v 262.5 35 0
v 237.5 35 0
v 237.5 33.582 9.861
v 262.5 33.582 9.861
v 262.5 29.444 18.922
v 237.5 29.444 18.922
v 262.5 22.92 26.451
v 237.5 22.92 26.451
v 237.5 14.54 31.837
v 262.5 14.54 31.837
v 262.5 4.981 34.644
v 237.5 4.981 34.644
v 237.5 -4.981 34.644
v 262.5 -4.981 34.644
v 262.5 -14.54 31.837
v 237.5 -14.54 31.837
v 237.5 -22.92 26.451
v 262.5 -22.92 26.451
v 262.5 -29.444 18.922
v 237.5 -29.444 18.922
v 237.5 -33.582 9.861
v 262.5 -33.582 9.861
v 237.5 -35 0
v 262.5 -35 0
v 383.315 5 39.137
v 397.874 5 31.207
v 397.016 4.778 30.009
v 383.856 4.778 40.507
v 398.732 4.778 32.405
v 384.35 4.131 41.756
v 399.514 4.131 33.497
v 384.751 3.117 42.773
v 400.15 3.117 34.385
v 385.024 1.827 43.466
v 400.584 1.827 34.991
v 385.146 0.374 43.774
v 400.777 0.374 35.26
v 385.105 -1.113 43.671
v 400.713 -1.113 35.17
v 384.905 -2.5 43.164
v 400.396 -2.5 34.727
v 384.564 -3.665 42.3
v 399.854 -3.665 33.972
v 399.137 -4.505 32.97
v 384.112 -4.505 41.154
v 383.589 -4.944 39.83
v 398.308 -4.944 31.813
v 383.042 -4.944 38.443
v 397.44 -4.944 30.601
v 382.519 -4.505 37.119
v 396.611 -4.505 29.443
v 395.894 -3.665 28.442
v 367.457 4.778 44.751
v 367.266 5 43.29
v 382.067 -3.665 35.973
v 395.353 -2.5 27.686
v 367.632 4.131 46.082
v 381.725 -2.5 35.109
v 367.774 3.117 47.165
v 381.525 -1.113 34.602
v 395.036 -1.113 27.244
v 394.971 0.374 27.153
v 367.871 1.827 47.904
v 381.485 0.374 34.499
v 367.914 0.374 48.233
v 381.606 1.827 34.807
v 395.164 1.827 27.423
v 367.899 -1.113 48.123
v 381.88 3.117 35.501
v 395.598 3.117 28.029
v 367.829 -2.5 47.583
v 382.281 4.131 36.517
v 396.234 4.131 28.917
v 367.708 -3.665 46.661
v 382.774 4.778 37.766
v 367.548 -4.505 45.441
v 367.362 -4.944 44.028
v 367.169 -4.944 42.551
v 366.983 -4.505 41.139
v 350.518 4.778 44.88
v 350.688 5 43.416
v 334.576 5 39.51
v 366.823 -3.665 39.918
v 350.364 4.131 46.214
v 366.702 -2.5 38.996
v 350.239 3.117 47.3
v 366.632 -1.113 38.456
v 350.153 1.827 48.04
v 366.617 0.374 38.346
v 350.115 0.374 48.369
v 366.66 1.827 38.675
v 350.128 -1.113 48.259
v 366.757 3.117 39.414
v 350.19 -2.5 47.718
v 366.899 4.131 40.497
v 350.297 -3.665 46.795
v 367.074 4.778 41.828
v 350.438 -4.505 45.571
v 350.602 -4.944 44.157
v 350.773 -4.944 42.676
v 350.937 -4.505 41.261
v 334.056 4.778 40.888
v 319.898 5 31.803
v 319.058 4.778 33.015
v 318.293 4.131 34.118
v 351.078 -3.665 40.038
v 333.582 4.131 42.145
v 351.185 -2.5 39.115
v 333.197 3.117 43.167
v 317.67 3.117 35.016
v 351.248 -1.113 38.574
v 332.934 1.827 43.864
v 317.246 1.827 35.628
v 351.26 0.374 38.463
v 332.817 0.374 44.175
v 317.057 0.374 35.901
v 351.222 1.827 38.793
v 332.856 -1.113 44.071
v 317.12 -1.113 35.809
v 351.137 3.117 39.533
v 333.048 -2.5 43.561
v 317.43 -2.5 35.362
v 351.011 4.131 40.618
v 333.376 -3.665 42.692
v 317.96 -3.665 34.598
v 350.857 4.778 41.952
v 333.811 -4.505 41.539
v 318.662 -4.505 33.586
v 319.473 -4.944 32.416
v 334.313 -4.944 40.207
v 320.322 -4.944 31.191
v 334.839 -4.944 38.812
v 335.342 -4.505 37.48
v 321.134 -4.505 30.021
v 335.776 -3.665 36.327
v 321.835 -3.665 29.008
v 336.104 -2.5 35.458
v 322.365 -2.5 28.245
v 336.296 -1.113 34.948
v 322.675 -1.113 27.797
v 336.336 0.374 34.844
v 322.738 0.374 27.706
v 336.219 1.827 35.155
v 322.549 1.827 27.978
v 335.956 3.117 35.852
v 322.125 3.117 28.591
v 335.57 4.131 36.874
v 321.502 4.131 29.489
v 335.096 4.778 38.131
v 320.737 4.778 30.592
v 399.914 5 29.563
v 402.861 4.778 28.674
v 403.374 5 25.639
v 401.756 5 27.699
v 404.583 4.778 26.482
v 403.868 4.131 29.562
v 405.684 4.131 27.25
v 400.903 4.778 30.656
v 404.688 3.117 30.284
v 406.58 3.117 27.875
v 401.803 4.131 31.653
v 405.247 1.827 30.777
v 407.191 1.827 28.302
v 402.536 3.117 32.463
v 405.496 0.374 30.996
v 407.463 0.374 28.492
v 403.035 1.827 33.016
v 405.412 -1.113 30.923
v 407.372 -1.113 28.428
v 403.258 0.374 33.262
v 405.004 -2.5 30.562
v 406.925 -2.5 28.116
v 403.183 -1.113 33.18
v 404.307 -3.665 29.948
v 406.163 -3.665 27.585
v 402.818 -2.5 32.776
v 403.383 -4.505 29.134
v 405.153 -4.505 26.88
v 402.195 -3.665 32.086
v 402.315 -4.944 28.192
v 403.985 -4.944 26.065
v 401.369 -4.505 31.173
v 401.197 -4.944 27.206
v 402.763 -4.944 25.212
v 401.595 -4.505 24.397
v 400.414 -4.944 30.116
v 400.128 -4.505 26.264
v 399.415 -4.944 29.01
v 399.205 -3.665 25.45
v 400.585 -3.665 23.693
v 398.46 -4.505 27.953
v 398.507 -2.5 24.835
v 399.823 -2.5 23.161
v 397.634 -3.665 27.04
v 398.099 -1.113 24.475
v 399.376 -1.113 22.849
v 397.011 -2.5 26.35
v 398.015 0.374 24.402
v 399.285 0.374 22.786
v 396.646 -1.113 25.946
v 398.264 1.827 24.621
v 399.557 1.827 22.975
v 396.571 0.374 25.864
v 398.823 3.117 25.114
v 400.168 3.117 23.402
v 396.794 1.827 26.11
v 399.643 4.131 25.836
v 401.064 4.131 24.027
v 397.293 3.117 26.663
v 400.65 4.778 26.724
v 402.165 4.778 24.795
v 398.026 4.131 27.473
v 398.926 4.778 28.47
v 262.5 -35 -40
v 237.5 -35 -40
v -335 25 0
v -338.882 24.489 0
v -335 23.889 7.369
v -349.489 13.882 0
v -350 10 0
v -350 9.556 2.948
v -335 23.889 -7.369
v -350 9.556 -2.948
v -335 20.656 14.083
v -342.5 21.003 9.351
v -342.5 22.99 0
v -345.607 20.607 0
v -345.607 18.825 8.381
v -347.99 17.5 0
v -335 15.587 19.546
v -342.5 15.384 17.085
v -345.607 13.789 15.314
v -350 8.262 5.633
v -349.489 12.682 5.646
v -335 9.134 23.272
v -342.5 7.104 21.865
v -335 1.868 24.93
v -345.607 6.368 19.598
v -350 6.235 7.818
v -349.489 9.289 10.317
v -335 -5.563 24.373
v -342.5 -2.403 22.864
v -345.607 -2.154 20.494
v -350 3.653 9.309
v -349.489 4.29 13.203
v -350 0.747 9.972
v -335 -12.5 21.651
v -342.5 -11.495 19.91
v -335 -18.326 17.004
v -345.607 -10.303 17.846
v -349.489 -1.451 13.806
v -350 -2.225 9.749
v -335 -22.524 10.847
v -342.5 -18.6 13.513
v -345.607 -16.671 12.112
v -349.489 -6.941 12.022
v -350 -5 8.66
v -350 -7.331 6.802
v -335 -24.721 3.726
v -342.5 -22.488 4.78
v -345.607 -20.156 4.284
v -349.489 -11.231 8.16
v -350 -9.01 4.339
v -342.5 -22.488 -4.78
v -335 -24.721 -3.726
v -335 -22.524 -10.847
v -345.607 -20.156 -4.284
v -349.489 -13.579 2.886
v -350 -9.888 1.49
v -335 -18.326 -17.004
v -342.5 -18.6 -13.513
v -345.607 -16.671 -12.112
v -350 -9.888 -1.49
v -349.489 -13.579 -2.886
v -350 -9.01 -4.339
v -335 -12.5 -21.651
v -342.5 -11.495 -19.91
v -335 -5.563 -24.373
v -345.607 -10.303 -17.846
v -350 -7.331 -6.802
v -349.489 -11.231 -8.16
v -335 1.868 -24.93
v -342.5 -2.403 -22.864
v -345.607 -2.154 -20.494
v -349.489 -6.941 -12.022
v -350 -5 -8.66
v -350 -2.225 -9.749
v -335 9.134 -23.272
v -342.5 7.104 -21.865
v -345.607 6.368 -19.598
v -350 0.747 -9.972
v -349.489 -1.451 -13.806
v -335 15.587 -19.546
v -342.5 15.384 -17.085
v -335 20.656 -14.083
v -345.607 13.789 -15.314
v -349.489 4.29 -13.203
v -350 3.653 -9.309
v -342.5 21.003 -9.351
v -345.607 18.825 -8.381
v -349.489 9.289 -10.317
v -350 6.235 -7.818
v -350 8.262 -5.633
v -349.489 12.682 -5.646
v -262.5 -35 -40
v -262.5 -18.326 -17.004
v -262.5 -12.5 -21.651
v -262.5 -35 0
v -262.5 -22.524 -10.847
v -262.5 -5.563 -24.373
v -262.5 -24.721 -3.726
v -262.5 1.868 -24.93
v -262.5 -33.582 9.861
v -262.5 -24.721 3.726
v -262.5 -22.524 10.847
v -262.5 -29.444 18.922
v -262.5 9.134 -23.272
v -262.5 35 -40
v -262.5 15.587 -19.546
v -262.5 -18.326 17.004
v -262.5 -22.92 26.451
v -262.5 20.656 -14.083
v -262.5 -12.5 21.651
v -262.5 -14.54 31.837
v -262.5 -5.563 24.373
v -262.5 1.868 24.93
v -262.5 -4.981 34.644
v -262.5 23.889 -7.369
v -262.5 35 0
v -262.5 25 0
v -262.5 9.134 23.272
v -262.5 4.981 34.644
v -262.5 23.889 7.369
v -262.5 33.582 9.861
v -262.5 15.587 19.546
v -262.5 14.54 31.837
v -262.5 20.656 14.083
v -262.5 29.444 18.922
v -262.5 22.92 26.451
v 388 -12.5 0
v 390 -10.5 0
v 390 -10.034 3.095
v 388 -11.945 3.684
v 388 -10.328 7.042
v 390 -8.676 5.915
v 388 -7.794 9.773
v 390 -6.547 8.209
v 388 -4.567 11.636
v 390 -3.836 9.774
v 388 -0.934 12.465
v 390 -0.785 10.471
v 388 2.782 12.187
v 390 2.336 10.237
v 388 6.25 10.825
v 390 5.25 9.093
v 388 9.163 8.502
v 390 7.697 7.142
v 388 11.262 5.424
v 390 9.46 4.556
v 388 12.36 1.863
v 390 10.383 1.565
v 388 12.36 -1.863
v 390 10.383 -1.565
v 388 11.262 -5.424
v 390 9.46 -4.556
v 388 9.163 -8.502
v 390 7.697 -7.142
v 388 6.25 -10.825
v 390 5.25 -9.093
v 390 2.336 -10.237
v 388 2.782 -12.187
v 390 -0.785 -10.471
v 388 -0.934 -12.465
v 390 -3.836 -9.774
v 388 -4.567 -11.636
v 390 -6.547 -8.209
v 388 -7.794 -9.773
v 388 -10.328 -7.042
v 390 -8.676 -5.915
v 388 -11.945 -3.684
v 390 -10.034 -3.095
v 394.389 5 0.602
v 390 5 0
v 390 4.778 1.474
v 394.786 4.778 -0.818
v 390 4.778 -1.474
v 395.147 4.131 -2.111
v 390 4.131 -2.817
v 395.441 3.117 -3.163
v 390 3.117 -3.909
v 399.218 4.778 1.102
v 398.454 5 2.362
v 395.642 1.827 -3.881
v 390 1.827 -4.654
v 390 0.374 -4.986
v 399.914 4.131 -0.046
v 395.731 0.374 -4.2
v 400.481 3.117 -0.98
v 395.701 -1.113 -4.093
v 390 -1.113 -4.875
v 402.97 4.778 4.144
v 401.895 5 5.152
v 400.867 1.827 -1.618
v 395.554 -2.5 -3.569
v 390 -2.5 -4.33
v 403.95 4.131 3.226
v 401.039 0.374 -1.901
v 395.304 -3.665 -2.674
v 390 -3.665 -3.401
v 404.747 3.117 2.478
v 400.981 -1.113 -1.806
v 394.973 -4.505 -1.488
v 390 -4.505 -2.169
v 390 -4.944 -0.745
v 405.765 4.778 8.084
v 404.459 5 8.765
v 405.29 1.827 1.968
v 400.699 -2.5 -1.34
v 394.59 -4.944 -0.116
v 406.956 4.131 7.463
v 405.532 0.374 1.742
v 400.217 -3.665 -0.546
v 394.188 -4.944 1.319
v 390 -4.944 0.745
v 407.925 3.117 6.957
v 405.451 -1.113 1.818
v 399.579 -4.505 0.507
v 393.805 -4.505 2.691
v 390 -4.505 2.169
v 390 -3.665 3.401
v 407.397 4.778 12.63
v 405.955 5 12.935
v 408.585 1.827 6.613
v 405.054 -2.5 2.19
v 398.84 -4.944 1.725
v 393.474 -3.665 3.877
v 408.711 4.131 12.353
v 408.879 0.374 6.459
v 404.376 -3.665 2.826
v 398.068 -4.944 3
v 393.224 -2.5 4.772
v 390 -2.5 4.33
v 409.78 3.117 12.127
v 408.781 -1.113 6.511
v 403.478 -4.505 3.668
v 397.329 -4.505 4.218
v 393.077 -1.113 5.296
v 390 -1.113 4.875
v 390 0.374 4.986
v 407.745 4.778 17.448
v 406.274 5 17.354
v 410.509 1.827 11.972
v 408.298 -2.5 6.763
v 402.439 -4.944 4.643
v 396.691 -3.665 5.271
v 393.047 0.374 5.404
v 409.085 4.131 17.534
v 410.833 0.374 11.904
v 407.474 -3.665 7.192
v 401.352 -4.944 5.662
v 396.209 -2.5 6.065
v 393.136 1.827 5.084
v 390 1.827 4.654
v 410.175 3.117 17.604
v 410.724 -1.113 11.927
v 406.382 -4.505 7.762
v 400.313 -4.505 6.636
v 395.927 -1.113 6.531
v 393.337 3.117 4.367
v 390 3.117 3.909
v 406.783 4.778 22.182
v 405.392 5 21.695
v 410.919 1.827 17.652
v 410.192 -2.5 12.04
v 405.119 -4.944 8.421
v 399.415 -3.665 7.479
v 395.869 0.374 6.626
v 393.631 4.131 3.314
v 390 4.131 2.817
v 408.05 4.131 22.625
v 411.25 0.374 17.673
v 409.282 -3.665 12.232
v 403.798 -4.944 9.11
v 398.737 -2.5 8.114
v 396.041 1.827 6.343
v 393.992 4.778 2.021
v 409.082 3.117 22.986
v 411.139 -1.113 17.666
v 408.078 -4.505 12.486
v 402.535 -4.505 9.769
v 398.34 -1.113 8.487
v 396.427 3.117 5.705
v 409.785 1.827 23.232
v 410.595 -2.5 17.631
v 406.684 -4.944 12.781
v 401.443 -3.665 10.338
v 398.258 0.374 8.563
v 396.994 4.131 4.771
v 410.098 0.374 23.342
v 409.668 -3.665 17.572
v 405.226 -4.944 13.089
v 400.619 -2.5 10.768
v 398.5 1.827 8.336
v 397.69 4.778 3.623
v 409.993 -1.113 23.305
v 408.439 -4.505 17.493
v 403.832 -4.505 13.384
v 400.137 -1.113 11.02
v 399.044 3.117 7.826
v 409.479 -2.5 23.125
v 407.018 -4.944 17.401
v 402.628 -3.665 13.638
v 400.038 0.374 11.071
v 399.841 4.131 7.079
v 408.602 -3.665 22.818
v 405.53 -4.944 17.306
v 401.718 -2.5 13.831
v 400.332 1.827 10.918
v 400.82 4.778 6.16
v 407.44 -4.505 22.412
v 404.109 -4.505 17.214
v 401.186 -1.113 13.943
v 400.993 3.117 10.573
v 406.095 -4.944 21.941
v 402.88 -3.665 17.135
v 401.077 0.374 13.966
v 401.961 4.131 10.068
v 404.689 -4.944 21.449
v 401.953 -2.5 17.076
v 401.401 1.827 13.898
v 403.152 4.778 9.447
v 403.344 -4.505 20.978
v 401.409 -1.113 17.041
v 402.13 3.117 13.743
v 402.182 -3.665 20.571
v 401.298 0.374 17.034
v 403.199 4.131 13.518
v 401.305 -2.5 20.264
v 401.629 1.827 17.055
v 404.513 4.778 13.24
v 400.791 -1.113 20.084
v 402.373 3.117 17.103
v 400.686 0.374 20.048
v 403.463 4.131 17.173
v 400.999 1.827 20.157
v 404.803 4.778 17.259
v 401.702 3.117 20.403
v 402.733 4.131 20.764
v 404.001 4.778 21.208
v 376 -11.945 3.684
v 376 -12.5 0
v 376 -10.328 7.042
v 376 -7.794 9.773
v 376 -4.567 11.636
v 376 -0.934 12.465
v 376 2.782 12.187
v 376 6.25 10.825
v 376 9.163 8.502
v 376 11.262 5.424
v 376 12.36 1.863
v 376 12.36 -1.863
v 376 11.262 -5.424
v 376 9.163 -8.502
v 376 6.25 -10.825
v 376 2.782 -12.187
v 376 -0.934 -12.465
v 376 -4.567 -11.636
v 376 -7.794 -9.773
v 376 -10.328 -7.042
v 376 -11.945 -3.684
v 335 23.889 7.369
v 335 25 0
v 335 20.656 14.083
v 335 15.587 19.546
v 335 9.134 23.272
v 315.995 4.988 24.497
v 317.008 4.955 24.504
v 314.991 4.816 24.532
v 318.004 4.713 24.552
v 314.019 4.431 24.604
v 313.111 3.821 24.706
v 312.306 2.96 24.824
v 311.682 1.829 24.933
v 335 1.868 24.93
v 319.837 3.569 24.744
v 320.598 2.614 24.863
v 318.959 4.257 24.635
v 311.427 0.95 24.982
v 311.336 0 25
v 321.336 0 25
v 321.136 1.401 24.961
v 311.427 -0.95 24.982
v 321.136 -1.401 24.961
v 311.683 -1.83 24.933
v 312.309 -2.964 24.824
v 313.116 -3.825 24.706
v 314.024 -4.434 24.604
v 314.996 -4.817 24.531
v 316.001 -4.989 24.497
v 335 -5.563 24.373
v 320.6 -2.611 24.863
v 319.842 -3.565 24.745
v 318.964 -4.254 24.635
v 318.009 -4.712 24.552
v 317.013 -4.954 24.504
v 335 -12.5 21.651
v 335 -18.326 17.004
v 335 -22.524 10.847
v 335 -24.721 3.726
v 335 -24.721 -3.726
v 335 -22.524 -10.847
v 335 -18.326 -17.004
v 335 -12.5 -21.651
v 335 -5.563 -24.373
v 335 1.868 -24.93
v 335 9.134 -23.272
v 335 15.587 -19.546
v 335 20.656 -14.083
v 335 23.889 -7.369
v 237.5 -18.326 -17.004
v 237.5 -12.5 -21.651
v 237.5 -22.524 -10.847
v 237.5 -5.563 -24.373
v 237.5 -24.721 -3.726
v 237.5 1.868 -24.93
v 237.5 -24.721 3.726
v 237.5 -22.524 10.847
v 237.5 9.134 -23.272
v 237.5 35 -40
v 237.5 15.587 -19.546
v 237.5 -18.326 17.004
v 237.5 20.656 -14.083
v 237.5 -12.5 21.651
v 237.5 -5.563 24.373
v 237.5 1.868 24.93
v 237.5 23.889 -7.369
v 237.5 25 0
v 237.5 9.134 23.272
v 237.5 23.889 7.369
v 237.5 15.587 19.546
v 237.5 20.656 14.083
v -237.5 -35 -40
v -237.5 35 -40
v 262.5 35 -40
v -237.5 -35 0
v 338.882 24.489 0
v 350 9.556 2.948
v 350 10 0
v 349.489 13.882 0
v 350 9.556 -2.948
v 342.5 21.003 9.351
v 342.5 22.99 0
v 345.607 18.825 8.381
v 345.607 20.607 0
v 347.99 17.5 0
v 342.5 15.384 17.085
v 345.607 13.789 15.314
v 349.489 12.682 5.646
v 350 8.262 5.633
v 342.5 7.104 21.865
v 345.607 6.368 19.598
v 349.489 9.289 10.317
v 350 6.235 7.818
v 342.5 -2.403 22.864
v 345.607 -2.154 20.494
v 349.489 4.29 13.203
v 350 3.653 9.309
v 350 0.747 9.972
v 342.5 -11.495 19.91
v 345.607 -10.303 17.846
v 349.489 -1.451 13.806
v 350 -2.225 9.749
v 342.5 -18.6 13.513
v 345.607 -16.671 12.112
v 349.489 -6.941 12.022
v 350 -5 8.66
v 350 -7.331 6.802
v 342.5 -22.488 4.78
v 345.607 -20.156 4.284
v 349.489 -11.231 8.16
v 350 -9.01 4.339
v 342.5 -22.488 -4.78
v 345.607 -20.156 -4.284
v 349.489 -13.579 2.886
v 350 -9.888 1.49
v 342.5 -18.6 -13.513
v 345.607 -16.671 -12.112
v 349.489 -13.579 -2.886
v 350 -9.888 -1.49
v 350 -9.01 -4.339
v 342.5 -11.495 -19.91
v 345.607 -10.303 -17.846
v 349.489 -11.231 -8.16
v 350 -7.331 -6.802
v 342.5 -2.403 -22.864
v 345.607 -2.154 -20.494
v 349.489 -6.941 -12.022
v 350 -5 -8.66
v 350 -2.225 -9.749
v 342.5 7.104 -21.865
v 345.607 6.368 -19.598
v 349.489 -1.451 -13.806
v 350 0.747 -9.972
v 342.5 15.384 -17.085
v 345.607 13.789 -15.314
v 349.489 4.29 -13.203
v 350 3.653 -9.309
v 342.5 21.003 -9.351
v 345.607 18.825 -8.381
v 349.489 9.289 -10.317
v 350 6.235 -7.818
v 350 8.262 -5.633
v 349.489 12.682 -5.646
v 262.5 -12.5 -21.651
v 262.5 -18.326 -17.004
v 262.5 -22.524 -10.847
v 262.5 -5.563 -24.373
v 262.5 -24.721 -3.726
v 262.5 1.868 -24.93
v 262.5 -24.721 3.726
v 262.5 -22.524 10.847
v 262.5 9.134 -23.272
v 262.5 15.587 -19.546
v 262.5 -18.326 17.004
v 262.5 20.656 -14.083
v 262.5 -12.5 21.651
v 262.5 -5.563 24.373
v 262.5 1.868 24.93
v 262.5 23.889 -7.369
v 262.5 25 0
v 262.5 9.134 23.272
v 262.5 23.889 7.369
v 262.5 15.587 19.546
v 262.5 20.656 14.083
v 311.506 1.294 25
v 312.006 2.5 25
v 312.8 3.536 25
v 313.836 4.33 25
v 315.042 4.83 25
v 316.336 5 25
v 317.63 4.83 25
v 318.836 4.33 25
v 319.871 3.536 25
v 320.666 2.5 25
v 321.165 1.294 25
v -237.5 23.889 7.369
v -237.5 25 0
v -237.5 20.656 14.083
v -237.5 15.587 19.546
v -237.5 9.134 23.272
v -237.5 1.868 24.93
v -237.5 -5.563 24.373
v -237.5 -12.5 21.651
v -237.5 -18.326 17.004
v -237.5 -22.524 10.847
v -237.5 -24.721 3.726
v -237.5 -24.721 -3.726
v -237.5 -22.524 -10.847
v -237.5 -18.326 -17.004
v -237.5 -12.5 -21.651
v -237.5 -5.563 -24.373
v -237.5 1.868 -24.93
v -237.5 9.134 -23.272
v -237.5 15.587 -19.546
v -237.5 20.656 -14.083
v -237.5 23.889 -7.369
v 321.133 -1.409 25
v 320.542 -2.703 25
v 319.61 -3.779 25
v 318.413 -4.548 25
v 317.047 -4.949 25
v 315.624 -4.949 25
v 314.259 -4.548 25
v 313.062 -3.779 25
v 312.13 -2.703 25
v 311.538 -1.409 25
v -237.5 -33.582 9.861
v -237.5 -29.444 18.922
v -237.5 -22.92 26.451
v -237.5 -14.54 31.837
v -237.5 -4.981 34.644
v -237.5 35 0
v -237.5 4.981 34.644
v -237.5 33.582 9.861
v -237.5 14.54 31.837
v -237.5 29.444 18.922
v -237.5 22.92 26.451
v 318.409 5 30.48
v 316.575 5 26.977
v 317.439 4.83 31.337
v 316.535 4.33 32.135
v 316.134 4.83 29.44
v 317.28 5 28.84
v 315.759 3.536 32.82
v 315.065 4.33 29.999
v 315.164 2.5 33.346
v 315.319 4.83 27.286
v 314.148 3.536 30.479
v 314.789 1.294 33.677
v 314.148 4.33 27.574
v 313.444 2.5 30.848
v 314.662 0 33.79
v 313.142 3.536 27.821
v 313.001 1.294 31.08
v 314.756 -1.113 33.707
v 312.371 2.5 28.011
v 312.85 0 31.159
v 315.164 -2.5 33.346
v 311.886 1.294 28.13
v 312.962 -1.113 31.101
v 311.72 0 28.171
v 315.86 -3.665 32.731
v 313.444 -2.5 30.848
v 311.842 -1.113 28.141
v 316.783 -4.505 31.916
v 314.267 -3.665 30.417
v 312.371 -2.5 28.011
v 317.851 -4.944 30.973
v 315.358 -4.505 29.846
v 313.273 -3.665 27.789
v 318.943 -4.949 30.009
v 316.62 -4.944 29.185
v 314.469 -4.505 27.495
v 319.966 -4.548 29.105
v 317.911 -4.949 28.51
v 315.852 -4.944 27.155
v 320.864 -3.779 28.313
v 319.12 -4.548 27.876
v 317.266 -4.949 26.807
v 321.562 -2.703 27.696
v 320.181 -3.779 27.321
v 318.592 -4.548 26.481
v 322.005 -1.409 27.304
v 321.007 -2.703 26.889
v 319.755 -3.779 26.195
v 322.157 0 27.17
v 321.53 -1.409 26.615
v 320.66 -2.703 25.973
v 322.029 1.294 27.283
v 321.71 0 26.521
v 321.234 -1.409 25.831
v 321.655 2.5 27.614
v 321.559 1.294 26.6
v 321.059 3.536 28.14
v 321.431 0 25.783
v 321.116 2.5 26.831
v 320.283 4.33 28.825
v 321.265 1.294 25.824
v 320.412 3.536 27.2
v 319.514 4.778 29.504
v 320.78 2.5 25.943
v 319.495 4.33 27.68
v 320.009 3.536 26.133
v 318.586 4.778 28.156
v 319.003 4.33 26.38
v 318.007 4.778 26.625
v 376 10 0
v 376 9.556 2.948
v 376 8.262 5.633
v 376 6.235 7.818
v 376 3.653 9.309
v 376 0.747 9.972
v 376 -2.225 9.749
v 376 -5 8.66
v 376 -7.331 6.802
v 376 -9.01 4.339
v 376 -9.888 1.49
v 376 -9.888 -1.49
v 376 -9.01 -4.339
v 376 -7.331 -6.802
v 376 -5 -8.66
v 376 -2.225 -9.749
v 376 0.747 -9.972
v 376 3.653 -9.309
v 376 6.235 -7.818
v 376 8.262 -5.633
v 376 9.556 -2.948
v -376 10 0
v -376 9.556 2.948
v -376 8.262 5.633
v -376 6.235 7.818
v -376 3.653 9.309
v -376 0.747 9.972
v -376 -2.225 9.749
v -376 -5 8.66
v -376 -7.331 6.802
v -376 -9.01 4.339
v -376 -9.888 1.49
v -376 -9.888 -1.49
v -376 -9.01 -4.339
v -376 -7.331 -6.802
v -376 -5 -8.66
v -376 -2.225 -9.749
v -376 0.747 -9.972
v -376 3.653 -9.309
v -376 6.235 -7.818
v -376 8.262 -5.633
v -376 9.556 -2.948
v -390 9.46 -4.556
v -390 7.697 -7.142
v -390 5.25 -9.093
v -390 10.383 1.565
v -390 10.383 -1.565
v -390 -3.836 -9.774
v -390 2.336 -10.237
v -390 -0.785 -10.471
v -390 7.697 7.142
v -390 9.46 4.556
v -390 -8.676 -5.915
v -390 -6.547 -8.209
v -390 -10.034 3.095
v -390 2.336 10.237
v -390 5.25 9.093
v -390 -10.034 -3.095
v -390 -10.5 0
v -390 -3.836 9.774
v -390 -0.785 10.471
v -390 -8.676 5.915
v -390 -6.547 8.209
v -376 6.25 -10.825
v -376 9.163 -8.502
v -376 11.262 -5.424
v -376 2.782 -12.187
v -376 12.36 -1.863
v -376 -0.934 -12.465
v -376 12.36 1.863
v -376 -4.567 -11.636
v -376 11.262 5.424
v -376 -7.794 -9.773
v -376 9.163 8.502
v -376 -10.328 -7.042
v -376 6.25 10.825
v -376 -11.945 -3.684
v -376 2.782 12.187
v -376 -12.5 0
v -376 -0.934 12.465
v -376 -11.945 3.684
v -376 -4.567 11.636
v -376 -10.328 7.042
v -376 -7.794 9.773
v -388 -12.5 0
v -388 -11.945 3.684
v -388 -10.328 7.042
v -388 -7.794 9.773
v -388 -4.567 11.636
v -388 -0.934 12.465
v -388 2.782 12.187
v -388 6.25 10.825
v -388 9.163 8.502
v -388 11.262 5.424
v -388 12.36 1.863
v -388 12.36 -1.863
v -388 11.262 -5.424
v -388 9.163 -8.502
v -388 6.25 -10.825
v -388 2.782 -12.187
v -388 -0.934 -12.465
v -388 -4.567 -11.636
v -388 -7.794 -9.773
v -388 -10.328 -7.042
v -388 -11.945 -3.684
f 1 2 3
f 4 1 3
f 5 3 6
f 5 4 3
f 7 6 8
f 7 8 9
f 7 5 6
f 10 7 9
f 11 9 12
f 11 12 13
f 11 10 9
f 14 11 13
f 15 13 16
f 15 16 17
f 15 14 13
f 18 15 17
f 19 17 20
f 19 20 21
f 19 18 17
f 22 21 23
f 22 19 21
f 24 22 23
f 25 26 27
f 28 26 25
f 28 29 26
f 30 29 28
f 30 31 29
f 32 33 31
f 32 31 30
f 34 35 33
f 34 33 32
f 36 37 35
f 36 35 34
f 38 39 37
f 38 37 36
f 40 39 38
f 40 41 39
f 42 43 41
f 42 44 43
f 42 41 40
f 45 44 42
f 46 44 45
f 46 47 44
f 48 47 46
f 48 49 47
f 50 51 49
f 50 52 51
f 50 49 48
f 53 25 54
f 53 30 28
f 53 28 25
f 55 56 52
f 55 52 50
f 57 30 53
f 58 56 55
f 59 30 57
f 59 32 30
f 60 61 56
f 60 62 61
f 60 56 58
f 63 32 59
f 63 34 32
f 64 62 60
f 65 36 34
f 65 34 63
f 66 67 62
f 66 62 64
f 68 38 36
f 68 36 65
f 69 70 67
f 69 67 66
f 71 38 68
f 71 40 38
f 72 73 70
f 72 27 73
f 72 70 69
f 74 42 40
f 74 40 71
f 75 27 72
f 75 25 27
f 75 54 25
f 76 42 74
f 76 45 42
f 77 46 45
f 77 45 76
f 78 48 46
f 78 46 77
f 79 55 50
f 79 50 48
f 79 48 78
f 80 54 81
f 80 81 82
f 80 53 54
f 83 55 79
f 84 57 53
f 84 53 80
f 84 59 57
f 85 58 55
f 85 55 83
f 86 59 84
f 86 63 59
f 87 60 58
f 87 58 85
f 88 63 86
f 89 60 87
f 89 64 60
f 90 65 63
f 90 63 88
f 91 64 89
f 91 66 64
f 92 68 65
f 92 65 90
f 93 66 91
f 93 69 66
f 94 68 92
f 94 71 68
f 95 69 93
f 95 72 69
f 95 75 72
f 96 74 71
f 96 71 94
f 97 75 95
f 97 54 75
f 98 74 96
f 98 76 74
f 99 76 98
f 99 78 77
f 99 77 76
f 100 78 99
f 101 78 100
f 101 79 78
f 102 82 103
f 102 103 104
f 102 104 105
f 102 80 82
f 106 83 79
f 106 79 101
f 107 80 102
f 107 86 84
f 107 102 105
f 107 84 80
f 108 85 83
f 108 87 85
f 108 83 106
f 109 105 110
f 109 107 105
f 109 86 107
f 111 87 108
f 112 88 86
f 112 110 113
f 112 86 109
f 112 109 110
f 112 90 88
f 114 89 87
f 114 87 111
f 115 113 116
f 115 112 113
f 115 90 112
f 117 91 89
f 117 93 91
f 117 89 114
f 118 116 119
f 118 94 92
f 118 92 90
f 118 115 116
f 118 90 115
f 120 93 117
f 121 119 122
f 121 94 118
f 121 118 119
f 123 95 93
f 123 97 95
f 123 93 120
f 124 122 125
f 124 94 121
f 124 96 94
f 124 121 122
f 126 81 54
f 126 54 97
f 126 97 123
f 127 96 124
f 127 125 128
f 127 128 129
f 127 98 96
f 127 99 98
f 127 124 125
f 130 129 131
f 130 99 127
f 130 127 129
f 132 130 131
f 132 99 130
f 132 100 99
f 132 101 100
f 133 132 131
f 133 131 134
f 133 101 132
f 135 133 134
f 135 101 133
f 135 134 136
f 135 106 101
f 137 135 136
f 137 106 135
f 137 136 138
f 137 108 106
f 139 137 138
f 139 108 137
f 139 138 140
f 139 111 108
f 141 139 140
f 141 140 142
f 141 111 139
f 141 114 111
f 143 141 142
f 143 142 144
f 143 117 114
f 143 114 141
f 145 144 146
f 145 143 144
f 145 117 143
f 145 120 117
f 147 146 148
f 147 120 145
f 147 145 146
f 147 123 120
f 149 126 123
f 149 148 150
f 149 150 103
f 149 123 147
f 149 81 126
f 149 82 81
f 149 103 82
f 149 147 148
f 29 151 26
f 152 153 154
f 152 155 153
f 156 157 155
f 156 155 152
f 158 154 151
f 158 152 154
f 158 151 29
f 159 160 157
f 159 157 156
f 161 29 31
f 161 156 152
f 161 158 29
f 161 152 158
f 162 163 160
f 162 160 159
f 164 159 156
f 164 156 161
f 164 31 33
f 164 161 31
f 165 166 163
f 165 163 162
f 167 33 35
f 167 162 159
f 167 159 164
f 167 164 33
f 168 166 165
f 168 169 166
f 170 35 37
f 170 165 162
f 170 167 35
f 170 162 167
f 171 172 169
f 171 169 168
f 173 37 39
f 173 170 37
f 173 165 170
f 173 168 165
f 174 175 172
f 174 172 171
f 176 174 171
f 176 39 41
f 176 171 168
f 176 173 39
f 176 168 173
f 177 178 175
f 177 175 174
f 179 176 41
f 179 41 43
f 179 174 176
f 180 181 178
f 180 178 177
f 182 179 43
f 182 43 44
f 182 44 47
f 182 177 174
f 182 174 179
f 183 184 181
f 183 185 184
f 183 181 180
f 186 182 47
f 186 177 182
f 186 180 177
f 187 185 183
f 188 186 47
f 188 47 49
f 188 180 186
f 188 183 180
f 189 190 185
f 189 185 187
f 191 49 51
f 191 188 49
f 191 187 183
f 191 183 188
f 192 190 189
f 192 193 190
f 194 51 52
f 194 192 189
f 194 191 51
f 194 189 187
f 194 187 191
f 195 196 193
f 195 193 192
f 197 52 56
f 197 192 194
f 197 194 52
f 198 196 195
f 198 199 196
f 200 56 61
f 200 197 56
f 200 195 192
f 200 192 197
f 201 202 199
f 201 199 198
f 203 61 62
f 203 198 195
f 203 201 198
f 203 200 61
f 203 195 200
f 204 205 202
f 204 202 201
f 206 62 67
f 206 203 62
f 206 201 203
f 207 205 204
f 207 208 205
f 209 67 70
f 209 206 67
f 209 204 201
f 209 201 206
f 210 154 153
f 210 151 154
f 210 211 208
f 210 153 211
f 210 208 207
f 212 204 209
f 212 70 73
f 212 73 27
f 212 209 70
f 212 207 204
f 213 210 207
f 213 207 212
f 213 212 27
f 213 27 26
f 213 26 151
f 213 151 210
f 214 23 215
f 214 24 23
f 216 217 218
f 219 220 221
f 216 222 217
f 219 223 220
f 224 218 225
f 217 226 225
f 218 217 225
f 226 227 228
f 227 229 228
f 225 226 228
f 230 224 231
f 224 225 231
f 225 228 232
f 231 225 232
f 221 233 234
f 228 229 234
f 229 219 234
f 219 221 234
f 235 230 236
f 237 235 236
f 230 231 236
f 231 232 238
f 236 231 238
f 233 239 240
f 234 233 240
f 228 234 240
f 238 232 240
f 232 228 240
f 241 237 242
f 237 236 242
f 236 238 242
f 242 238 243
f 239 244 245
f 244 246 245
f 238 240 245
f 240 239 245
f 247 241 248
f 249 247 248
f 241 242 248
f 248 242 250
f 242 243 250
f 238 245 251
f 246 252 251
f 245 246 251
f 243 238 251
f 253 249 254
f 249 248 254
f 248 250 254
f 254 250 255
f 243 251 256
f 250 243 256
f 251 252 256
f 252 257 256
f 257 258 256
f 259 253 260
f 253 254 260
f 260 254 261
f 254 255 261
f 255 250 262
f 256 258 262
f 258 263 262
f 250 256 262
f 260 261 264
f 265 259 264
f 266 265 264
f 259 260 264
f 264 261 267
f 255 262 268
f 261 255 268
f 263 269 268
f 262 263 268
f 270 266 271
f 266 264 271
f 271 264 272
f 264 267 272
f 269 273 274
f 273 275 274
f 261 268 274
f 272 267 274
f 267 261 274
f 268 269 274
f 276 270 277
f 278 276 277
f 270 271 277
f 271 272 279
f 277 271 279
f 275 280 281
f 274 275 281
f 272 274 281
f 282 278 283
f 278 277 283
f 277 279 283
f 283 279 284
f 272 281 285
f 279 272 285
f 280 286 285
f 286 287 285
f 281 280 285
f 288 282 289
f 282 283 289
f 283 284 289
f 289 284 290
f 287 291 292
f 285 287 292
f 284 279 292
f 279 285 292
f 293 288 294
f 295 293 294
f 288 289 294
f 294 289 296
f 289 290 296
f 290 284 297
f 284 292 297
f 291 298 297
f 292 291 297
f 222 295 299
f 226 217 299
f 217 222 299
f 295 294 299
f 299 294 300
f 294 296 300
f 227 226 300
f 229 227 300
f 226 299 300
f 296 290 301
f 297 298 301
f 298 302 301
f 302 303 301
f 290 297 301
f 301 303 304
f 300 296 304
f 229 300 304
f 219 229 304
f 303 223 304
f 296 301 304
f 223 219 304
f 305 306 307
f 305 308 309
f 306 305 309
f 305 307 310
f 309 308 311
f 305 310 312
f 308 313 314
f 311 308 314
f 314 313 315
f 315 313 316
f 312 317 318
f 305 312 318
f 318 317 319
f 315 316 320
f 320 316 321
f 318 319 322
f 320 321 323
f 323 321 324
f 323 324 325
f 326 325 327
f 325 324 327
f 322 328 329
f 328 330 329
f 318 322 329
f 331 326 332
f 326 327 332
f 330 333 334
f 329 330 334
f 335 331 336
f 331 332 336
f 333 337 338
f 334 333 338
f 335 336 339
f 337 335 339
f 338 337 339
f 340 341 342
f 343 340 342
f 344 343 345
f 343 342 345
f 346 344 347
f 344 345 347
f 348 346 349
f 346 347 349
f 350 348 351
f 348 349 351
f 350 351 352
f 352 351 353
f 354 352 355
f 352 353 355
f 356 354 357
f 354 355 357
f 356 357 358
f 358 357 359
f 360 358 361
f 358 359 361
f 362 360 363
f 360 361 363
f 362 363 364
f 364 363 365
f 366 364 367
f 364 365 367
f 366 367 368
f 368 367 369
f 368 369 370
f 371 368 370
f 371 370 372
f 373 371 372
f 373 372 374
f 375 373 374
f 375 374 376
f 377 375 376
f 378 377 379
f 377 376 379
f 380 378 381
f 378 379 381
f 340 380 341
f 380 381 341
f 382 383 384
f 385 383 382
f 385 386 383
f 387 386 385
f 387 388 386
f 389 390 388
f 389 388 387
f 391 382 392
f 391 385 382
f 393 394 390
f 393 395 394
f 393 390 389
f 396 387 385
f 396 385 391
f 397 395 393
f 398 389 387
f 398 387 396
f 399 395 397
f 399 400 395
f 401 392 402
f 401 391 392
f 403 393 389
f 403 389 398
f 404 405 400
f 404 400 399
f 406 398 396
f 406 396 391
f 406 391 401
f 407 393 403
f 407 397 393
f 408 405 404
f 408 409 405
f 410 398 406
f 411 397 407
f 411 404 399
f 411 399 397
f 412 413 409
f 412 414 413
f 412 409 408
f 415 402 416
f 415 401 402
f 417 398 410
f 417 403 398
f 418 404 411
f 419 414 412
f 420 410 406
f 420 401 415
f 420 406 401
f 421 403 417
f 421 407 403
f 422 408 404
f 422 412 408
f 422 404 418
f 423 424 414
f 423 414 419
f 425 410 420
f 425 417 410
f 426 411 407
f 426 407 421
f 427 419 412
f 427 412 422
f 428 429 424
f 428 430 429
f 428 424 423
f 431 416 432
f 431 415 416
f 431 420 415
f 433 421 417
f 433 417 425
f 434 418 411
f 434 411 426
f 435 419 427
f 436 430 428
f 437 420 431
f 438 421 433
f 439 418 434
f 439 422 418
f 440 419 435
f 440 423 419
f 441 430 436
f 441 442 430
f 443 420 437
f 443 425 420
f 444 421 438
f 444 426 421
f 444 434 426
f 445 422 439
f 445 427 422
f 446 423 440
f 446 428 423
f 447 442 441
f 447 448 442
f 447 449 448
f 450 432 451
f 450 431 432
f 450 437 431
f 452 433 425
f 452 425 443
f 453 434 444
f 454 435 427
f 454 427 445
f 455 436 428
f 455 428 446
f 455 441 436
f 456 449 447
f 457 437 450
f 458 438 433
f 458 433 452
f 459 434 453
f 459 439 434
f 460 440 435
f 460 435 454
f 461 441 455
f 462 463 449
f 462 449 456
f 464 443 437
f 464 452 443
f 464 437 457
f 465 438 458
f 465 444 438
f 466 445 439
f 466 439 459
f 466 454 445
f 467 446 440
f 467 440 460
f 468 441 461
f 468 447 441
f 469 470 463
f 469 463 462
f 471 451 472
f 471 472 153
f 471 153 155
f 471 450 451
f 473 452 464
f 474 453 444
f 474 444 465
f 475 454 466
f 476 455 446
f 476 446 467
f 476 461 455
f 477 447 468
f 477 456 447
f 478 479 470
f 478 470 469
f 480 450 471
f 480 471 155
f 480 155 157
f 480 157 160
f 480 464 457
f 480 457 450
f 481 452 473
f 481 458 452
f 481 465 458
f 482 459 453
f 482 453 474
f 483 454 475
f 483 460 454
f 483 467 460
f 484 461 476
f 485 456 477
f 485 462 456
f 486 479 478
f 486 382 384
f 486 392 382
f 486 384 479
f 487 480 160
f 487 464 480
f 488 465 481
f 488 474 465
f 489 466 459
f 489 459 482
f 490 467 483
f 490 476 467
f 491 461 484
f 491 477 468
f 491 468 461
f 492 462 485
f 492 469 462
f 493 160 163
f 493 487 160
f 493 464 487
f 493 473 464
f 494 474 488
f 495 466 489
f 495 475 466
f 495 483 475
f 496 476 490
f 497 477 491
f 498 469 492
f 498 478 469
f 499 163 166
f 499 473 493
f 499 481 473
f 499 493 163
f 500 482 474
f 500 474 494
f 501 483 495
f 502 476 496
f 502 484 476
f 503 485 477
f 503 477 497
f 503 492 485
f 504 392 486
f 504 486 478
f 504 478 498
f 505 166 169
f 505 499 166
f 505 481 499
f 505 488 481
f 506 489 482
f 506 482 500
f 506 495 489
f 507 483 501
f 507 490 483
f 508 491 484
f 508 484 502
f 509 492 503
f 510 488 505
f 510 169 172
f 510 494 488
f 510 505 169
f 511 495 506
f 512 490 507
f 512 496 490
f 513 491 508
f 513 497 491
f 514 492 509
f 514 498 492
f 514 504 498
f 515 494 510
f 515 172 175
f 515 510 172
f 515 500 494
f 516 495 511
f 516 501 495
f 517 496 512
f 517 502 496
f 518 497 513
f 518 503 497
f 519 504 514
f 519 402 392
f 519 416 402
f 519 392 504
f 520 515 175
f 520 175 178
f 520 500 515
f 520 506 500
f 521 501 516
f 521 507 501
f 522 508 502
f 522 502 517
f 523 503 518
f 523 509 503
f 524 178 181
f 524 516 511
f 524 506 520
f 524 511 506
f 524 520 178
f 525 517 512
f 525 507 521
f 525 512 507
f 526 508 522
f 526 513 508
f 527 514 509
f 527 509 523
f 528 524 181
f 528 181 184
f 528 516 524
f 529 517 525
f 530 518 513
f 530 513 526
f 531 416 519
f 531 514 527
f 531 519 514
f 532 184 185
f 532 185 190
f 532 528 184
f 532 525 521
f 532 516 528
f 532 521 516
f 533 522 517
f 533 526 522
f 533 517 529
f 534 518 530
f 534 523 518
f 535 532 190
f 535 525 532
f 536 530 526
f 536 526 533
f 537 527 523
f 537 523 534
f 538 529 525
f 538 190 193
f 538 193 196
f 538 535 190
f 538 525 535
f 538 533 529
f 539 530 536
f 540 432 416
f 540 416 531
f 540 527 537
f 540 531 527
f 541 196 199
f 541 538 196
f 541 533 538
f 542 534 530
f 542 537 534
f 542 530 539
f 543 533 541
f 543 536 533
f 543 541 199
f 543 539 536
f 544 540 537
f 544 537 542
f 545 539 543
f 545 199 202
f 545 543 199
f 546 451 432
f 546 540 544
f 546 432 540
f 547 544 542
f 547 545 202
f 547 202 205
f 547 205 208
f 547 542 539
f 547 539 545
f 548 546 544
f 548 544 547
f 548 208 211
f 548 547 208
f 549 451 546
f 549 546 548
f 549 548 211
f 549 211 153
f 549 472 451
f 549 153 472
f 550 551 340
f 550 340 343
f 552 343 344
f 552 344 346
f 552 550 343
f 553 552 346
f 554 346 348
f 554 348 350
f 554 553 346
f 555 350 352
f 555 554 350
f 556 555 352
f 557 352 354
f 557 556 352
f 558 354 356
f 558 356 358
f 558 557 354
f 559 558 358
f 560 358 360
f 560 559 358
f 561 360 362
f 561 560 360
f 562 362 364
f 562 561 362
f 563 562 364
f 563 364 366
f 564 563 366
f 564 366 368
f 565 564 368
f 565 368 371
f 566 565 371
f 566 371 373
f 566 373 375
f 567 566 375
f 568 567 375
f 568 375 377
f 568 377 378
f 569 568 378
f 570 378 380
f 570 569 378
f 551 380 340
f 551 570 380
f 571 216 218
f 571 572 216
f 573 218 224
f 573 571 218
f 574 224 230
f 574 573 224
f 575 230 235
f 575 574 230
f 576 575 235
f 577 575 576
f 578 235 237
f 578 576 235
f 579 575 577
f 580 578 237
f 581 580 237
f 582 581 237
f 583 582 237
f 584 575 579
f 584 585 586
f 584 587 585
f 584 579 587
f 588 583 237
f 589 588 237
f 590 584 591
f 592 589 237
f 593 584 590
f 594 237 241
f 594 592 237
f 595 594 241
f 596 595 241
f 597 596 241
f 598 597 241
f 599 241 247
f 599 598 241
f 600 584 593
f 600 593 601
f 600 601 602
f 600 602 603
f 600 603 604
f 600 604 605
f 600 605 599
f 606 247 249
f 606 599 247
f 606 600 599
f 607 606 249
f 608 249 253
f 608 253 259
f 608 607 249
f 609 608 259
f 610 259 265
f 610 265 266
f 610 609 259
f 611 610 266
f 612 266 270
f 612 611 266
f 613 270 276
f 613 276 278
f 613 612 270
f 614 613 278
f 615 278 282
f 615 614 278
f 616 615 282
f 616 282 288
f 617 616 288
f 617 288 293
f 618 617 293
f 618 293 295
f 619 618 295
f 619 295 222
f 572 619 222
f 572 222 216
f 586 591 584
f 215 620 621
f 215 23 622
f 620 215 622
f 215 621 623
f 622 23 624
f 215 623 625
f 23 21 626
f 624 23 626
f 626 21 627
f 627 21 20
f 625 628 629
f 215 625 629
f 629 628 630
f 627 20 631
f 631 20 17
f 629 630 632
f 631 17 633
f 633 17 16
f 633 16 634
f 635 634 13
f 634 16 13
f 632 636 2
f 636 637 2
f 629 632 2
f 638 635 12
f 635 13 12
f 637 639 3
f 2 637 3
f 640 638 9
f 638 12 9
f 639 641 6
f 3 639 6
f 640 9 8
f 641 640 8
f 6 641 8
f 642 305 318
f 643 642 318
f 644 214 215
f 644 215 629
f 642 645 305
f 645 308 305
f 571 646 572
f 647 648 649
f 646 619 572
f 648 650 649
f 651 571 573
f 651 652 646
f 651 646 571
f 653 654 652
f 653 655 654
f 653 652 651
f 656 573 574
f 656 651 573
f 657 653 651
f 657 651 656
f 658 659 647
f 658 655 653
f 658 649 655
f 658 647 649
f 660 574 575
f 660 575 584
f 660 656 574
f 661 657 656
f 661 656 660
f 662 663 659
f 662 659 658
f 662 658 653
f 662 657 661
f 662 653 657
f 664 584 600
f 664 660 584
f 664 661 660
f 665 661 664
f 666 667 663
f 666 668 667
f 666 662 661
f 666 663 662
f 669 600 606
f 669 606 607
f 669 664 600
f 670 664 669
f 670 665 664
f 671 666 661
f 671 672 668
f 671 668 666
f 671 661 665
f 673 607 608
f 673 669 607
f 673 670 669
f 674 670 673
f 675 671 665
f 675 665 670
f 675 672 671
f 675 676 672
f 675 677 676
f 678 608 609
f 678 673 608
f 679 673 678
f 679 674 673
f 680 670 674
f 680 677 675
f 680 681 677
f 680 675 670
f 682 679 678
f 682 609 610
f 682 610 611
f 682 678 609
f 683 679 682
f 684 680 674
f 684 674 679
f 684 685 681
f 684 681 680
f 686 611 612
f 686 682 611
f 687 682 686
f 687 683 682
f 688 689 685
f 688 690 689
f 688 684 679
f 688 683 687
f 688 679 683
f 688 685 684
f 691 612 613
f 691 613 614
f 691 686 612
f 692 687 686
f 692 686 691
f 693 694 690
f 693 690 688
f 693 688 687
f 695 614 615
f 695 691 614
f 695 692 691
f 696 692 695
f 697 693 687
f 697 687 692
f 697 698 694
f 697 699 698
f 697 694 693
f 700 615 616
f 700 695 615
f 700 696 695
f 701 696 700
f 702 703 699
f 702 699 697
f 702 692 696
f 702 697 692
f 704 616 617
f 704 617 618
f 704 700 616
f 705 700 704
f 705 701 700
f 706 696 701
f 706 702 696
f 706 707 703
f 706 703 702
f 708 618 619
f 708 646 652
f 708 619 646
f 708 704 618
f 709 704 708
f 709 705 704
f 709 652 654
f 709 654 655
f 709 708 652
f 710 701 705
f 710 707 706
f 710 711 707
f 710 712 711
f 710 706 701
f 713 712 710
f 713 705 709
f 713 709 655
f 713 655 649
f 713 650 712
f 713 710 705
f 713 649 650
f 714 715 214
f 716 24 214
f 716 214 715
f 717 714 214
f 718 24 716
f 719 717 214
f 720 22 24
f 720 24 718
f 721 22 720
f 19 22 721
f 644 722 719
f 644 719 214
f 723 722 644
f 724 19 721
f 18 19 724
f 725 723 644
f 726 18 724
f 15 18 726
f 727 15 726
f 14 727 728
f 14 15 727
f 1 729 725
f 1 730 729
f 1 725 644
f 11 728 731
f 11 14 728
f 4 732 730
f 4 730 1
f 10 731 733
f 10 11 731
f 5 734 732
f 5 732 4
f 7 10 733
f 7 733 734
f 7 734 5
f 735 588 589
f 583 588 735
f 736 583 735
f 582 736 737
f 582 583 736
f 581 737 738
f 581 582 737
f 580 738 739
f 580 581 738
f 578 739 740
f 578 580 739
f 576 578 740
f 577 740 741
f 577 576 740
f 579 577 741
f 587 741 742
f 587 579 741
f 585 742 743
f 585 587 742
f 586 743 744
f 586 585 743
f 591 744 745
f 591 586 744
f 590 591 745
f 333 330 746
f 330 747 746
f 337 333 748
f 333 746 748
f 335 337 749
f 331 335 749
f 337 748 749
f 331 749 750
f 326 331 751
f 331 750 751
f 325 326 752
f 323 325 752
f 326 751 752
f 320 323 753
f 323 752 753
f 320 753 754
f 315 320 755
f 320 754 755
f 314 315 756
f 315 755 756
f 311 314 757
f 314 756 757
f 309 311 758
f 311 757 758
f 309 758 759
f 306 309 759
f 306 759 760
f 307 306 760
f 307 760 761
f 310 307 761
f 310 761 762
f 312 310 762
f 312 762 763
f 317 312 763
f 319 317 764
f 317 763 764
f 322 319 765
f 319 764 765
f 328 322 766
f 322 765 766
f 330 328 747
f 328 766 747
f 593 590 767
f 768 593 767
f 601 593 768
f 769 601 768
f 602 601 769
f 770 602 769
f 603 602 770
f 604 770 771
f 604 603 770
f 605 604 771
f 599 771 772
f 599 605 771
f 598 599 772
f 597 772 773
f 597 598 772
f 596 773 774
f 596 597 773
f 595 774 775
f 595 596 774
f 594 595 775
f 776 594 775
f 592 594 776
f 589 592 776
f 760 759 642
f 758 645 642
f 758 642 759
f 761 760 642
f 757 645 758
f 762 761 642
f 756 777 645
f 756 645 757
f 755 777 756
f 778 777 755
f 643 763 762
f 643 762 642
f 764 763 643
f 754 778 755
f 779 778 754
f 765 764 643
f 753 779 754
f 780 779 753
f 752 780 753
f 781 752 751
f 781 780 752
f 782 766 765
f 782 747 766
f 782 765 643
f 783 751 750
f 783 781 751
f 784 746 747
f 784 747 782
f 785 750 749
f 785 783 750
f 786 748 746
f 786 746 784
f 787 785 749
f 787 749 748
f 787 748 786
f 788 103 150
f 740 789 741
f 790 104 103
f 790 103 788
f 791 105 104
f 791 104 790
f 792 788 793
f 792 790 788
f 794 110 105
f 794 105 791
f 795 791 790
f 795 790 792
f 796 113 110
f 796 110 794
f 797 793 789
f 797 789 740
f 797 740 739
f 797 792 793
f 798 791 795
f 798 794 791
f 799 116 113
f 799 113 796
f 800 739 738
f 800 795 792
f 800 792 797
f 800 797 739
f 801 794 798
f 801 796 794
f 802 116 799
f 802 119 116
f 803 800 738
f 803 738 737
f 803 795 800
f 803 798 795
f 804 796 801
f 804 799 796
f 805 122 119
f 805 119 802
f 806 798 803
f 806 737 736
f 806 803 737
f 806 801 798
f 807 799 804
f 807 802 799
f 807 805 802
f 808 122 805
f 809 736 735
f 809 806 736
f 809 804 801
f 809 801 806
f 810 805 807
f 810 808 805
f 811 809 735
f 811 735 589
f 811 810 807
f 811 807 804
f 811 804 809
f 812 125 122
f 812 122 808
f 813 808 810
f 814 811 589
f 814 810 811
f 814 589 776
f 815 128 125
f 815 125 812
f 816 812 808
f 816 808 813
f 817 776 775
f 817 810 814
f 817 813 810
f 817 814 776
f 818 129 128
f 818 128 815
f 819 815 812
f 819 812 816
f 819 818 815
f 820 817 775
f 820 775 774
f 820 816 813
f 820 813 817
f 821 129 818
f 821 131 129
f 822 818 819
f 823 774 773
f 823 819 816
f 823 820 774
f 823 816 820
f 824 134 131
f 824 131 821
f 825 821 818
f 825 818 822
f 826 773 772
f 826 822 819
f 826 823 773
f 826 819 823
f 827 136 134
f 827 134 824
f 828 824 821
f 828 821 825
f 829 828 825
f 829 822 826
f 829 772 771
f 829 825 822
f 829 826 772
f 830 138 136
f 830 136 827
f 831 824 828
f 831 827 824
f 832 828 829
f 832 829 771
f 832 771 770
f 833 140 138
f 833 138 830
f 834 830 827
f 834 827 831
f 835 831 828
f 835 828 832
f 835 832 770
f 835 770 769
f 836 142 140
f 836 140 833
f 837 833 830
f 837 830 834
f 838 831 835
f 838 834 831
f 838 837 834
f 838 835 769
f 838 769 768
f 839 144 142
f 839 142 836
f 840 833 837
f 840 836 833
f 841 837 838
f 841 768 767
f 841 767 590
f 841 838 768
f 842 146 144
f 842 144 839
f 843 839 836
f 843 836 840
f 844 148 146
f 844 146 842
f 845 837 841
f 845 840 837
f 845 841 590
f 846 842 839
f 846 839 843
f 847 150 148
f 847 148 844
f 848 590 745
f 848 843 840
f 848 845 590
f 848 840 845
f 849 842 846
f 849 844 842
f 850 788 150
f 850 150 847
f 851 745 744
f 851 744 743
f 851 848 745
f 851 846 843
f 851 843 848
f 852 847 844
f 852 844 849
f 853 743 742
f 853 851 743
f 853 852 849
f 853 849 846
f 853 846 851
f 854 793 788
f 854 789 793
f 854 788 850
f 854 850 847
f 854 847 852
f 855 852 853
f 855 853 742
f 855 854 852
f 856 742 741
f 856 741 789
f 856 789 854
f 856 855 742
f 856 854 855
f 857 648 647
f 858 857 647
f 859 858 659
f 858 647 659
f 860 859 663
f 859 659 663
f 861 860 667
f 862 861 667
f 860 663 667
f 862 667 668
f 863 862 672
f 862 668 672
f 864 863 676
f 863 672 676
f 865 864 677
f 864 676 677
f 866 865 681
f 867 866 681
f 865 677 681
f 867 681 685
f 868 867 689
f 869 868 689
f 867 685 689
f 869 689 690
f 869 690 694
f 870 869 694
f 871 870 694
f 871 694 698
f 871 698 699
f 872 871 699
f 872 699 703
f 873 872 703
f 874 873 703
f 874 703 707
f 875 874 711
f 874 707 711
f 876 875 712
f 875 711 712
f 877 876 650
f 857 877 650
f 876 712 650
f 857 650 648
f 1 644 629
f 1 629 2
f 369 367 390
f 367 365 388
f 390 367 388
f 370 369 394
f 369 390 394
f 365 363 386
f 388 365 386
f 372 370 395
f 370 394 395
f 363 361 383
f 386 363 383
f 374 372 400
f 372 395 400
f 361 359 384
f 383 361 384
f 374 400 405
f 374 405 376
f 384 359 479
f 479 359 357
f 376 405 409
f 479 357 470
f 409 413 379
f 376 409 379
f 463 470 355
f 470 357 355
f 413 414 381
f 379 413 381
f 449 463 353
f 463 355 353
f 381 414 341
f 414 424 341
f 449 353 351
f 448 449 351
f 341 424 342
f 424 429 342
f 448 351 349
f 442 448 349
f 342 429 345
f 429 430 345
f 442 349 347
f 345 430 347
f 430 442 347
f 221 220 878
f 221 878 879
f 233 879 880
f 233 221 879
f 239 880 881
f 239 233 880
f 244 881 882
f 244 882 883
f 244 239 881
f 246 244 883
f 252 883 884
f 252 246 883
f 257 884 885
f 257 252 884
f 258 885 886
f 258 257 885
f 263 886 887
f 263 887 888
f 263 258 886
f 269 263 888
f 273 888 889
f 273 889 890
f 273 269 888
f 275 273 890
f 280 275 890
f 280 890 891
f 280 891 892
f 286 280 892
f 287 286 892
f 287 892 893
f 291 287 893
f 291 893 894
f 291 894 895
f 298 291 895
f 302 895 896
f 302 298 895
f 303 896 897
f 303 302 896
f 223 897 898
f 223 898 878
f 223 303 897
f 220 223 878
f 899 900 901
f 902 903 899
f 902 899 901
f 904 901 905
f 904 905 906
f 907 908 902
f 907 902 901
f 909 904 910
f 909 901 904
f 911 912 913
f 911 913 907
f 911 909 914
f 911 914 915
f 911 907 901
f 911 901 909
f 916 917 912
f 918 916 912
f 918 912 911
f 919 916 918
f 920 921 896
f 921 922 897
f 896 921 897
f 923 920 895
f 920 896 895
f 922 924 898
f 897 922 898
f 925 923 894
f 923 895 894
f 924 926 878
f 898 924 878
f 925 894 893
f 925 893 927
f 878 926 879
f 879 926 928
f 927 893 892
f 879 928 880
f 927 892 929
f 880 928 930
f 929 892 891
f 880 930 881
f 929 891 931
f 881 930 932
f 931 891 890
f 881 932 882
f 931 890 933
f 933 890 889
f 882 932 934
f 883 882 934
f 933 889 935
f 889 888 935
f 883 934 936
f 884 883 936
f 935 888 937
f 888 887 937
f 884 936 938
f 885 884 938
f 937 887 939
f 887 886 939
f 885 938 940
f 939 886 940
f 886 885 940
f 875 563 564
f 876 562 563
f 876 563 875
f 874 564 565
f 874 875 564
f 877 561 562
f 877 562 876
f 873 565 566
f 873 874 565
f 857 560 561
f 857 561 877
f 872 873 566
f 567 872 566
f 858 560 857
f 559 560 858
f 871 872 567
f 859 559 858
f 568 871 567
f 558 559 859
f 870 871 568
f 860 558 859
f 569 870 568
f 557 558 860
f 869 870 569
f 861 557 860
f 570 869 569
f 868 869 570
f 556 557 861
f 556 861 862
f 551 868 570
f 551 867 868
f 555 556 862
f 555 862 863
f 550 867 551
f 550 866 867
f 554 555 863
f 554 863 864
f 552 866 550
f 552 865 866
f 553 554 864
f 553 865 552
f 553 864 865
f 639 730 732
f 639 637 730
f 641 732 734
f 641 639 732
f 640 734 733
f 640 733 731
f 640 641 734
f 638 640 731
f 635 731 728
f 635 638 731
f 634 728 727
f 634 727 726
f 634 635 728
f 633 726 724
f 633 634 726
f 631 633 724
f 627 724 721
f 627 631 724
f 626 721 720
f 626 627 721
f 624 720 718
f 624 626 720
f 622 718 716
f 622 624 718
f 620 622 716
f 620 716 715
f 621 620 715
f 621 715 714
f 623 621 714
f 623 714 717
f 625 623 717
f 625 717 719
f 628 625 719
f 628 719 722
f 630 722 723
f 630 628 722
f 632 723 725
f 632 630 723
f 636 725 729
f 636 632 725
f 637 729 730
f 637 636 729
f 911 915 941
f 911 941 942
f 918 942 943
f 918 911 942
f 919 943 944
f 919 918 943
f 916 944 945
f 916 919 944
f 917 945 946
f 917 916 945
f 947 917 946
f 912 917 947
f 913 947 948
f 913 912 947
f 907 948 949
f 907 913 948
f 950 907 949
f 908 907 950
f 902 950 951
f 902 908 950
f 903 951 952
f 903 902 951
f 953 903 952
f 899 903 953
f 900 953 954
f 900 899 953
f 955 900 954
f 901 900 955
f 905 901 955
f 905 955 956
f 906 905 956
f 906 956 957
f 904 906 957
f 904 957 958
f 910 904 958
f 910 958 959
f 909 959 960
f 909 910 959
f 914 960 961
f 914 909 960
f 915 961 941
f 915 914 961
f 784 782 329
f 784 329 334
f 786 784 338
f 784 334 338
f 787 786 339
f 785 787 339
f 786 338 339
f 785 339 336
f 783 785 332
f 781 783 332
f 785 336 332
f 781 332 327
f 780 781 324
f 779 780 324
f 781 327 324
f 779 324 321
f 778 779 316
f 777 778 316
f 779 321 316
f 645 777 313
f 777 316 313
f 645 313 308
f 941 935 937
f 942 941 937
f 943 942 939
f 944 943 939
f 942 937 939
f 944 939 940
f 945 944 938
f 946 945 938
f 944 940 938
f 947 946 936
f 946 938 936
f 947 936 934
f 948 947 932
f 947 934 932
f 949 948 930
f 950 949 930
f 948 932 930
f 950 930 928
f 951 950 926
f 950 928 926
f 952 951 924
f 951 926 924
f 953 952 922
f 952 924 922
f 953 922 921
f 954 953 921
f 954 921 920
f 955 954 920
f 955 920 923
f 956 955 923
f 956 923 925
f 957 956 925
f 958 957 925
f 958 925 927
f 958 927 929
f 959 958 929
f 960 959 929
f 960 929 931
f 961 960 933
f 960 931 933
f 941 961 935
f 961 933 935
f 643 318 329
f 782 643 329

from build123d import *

# Parameters (mm, degrees)
F0_R      = 25
F1_DEPTH  = 350
F2_R      = 15
F3_DEPTH  = 26
F4_R      = 12.5
F5_DEPTH  = 14
F8_R      = 5
F10_SIZE  = 2
F12_R     = 25
F13_DEPTH = 12.5


with BuildPart() as f1:
    # F0 (on Right) → F1 (new body, symmetric)
    with BuildSketch(Plane.YZ):
        Circle(F0_R)
    extrude(amount=F1_DEPTH, both=True)

    # F2
    f2_edges = [f1.edges().sort_by_distance(p)[0] for p in [
        (-350, -25, 0),
        (350, -25, 0),
    ]]
    fillet(f2_edges, radius=F2_R)


with BuildPart() as f3:
    # F3 (new): a face of the model
    f3_faces = [f1.part.faces().sort_by_distance(p)[0] for p in [
        (-350, 0, 0),
    ]]
    extrude(f3_faces, amount=F3_DEPTH)

    # F4 (on face) → F5 (join)
    with BuildSketch(Plane(origin=(-376, 0, 0), x_dir=(0, -1, 0), z_dir=(-1, 0, 0))):
        Circle(F4_R)
    extrude(amount=F5_DEPTH)


with BuildPart() as f1_1:
    add(f1.part)

    # F6: F3 across plane
    add(f3.part.mirror(Plane.YZ))

    add(f3.part)  # F9 merges F3
    # F9: sweep along a path in F7
    with BuildLine(Plane.XZ) as f9_path:
        ThreePointArc((390, 0), (404.4586143035, 8.7653716807), (403.3740943516, 25.6386370656))
        ThreePointArc((403.3740943516, 25.6386370656), (400.8614530359, 28.6570791704), (397.8742399187, 31.2067687426))
        ThreePointArc((397.8742399187, 31.2067687426), (358.9804533336, 43.8624050182), (319.8975799307, 31.8033515292))
        ThreePointArc((319.8975799307, 31.8033515292), (317.2801425407, 28.8396439573), (316.3358569145, 25))
        Line((316.3358569145, 25), (316.3358569145, 15.1982838288))
    # F8 (on face) → F9 (sweep)
    with BuildSketch(Plane.YZ.offset(390)):
        Circle(F8_R)
    sweep(path=f9_path.line)

    # F10
    f10_edges = [f1_1.edges().sort_by_distance(p)[0] for p in [
        (-390, 12.5, 0),
        (390, 12.5, 0),
    ]]
    chamfer(f10_edges, length=F10_SIZE)


with BuildPart() as f13:
    # F12 (on offset) → F13 (new body, symmetric)
    with BuildSketch(Plane.YZ.offset(250)):
        with BuildLine():
            Line((-35, 0), (-35, -40))
            Line((-35, -40), (35, -40))
            Line((35, -40), (35, 0))
            ThreePointArc((35, 0), (0, 35), (-35, 0))
        make_face()
        Circle(F12_R, mode=Mode.SUBTRACT)
    extrude(amount=F13_DEPTH, both=True)


with BuildPart() as f14_1:
    # F14: instance of F13
    add(f13.part.mirror(Plane.YZ))


solid = Compound([f1_1.part, f13.part, f14_1.part])
